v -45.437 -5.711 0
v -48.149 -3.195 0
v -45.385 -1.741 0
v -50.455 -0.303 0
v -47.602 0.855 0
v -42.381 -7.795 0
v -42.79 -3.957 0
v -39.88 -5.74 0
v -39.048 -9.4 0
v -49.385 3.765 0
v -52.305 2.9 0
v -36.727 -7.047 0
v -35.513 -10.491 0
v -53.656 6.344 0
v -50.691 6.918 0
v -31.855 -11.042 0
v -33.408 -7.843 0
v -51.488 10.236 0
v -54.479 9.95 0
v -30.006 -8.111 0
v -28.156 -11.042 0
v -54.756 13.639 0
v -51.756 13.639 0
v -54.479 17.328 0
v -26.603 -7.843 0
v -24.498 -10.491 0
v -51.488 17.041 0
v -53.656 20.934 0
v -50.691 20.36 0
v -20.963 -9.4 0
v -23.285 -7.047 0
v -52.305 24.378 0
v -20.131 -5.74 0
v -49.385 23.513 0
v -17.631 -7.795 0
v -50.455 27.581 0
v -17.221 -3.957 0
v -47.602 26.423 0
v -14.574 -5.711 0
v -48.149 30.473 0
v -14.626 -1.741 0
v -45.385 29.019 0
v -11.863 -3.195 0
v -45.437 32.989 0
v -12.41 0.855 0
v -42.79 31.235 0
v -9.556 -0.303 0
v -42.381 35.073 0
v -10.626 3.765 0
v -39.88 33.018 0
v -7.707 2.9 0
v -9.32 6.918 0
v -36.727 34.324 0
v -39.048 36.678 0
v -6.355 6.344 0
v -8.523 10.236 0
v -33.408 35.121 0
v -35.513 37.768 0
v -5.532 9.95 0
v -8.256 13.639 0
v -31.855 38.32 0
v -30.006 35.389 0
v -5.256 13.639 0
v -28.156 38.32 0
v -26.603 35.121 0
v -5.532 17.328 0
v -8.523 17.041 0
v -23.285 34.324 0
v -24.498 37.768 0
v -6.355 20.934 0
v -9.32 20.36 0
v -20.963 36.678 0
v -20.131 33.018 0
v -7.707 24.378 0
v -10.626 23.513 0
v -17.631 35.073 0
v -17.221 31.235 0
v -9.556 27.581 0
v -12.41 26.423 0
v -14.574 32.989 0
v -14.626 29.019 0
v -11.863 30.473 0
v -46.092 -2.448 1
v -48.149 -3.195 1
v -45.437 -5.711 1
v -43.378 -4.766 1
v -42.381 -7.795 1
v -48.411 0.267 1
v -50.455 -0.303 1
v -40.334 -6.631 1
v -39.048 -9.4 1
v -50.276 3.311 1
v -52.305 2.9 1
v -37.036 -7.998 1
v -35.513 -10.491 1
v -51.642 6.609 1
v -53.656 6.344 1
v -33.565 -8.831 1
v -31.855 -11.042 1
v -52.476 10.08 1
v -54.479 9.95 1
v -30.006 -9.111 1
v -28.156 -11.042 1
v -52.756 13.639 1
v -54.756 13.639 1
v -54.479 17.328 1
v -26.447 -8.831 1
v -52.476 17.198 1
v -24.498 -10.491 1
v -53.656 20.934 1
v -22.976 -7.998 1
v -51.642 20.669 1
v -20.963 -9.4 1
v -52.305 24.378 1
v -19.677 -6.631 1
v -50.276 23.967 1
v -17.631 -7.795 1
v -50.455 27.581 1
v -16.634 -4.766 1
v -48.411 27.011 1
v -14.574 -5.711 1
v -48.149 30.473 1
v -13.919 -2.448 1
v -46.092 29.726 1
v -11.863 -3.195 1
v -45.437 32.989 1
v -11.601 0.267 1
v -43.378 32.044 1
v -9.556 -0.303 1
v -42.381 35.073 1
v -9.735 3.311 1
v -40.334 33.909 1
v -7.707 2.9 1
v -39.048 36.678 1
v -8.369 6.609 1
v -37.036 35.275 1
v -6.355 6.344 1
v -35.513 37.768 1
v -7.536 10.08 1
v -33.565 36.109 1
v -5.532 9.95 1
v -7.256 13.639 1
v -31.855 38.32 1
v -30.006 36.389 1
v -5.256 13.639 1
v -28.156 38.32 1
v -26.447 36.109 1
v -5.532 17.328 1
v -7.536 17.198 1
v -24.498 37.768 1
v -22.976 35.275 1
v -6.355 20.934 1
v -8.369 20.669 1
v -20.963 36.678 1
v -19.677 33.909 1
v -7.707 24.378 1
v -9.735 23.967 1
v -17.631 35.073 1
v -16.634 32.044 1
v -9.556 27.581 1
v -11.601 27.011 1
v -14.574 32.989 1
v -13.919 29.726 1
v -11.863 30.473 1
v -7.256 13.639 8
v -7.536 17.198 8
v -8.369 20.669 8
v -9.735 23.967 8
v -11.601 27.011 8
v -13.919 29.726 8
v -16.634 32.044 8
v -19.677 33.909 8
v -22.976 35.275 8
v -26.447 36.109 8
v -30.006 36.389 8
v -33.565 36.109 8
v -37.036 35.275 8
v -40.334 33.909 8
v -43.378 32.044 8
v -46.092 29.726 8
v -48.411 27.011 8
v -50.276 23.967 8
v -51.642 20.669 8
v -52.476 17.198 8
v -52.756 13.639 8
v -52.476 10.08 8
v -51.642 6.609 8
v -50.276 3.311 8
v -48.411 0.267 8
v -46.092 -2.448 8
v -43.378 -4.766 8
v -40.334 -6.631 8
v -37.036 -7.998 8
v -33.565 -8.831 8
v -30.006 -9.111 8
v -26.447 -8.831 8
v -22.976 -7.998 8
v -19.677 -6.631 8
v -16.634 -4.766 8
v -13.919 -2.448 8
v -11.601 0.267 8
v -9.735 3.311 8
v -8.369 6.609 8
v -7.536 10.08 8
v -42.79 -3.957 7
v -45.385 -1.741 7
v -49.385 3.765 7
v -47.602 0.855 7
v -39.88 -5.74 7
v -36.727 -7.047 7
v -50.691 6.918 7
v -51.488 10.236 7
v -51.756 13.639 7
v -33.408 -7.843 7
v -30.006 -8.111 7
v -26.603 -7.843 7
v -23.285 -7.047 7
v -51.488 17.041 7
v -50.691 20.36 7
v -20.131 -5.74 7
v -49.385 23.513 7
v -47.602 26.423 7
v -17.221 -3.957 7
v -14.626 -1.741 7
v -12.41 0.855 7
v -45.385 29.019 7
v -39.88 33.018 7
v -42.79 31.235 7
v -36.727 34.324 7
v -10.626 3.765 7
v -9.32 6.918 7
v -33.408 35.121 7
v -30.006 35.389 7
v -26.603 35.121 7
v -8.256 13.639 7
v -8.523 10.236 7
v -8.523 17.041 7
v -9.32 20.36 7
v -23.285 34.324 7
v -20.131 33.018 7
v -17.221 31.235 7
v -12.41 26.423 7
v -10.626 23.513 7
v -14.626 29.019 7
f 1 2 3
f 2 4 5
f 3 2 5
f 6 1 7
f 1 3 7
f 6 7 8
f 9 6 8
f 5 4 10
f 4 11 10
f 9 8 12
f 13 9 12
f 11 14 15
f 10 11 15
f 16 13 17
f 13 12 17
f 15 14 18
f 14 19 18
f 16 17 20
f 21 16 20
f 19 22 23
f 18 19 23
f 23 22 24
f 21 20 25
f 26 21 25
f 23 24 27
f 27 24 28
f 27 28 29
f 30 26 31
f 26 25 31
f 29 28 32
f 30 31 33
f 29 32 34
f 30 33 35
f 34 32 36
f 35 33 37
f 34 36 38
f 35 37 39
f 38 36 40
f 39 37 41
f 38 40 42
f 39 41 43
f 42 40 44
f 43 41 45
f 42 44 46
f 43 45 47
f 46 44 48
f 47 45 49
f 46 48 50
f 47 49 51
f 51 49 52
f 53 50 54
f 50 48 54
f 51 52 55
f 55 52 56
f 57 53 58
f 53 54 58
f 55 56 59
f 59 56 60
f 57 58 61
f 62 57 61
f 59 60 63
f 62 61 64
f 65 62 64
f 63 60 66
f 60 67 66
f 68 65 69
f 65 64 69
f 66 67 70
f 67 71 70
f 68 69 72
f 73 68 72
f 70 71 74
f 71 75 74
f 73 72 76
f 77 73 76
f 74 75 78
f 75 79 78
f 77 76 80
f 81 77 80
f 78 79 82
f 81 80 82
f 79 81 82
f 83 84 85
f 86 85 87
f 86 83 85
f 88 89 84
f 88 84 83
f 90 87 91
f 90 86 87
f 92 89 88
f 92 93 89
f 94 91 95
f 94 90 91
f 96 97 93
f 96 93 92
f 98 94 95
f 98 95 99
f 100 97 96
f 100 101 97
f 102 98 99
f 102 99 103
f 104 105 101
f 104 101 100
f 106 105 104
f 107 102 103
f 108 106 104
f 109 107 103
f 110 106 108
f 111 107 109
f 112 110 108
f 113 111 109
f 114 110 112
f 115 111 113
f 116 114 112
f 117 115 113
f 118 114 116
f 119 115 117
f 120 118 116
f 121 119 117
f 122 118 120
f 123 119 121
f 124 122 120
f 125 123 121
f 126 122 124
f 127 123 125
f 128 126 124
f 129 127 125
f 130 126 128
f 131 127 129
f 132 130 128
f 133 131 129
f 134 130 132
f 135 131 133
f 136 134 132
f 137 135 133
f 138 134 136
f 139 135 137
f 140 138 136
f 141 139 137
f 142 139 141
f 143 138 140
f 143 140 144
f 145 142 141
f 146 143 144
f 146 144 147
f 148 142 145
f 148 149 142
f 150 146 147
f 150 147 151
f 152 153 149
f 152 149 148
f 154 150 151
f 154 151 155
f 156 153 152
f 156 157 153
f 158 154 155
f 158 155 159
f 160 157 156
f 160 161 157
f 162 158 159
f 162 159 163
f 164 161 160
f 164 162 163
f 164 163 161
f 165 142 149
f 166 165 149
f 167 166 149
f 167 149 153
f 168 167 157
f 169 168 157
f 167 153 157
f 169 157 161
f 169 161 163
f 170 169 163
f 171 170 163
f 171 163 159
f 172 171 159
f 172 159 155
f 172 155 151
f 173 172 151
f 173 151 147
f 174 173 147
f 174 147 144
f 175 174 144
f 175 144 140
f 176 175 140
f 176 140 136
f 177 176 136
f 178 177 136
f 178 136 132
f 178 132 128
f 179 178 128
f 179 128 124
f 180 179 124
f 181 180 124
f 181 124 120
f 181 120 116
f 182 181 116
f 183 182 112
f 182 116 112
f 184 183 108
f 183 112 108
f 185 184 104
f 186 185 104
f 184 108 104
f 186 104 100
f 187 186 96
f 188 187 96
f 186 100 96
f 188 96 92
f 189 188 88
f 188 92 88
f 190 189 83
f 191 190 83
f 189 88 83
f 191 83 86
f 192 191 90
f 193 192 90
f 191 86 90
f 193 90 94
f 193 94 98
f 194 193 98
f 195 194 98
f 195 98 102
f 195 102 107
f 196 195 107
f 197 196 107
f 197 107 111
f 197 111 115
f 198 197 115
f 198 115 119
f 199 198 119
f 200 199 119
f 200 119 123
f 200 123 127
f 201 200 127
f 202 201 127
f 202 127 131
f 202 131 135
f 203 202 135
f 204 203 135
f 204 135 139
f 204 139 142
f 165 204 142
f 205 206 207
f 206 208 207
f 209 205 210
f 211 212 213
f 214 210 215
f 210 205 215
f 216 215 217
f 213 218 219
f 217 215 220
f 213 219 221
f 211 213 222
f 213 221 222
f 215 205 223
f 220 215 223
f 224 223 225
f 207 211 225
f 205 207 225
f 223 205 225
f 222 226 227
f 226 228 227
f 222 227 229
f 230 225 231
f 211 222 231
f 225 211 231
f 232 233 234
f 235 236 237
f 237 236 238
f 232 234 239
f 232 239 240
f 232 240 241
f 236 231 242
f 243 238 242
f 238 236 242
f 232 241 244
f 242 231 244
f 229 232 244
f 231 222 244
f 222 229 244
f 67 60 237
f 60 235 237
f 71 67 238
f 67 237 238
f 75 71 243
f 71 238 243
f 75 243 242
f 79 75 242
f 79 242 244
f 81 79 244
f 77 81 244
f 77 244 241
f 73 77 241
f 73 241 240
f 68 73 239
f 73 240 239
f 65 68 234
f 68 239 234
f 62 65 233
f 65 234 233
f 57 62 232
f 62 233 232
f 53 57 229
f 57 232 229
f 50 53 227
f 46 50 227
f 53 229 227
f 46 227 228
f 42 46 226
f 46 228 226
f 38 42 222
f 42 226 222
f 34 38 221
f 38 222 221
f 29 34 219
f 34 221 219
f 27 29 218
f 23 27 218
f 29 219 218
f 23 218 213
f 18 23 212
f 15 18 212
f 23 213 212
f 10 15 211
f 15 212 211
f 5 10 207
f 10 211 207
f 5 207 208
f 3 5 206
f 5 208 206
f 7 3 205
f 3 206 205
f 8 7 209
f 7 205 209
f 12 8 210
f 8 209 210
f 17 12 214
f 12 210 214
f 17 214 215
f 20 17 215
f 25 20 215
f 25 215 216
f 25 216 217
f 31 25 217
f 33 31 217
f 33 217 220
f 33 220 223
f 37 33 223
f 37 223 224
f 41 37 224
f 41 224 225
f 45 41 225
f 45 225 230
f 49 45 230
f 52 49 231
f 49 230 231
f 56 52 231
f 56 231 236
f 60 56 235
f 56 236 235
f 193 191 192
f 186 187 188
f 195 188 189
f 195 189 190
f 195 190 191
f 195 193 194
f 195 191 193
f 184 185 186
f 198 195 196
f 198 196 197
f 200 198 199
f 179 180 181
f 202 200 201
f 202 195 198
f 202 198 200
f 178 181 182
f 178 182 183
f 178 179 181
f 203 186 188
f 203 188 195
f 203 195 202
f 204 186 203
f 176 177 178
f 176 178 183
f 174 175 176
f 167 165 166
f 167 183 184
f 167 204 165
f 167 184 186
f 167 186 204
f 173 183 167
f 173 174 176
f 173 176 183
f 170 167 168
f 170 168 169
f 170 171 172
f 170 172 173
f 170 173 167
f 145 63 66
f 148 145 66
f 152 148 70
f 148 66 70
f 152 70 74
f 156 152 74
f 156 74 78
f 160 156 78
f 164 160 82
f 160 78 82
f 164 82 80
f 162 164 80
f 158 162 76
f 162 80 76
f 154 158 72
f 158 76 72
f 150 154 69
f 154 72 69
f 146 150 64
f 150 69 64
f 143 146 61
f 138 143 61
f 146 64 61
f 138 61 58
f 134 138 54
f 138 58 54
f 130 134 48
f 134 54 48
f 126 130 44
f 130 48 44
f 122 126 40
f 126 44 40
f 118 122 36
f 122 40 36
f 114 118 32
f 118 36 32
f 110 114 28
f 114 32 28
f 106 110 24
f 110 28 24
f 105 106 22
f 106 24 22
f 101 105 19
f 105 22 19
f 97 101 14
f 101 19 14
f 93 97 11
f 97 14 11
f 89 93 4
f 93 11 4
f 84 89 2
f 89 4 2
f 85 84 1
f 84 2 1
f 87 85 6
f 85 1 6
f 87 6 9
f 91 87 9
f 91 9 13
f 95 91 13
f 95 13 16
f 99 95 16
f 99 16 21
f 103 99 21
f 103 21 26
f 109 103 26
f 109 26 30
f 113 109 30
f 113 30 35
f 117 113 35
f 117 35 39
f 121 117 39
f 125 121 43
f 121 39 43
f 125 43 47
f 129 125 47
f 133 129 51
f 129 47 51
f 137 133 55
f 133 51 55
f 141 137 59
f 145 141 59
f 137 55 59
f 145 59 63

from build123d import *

# Parameters (mm, degrees)
F0_R     = 24.75
F0_R_2   = 22.75
F1_DEPTH = 1
F0_R_3   = 21.75
F0_R_4   = 20.75
F2_DEPTH = 8
F3_T     = 1


# Not quite as in the source:
# - a shell that OpenCascade refuses in one call is made with other operations: the cavity is built on its own and cut out


with BuildPart() as f1:
    # F0 (on Top) → F1 (new body)
    with BuildSketch(Plane.XY):
        with Locations((-30.0056487322, 13.6389313266)):
            Circle(F0_R)
        with Locations((-30.0056487322, 13.6389313266)):
            Circle(F0_R_2, mode=Mode.SUBTRACT)
    extrude(amount=F1_DEPTH)

    # F0 (on Top) → F2 (join)
    with BuildSketch(Plane.XY):
        with Locations((-30.0056487322, 13.6389313266)):
            Circle(F0_R_2)
        with Locations((-30.0056487322, 13.6389313266)):
            Circle(F0_R_3, mode=Mode.SUBTRACT)
        with Locations((-30.0056487322, 13.6389313266)):
            Circle(F0_R_3)
        with Locations((-30.0056487322, 13.6389313266)):
            Circle(F0_R_4, mode=Mode.SUBTRACT)
        with Locations((-30.0056487322, 13.6389313266)):
            Circle(F0_R_4)
    extrude(amount=F2_DEPTH)

    # F3: shell of thickness 1, made by hand


with BuildPart() as f3_core1:
    # F3_t2: copy of F1
    add(f1.part)

    # the walls: a layer under each face that stays
    f3_faces = [f3_core1.faces().sort_by_distance(p)[0] for p in [
        (-54.7556487322, 13.6389313266, 0.5),
        (-46.5056487322, -2.8610686734, 1),
        (-52.7556487322, 13.6389313266, 4.5),
        (-30.0056487322, 13.6389313266, 8),
    ]]
    thicken(f3_faces, amount=-F3_T, mode=Mode.SUBTRACT)

    # F3_s3 → F3_t4 (revolve, cut)
    with BuildSketch(Plane.XZ.offset(-13.6389313266)):
        Polygon((-7.2456487322, 1.01), (-7.2556487322, 0), (-8.2556487322, 0), (-8.2556487322, 1), align=None)
    revolve(axis=Axis((-30.0056487322, 13.6389313266, 1), (0, 0, 1)), mode=Mode.SUBTRACT)


with BuildPart() as f1_1:
    add(f1.part)

    # what is left inside the walls is the cavity
    f3_cavity = [f3_core1.part.solids().sort_by_distance(p)[0] for p in [
        (-30.005649, 6.388931, 6.99),
    ]]
    add(f3_cavity, mode=Mode.SUBTRACT)


solid = f1_1.part
